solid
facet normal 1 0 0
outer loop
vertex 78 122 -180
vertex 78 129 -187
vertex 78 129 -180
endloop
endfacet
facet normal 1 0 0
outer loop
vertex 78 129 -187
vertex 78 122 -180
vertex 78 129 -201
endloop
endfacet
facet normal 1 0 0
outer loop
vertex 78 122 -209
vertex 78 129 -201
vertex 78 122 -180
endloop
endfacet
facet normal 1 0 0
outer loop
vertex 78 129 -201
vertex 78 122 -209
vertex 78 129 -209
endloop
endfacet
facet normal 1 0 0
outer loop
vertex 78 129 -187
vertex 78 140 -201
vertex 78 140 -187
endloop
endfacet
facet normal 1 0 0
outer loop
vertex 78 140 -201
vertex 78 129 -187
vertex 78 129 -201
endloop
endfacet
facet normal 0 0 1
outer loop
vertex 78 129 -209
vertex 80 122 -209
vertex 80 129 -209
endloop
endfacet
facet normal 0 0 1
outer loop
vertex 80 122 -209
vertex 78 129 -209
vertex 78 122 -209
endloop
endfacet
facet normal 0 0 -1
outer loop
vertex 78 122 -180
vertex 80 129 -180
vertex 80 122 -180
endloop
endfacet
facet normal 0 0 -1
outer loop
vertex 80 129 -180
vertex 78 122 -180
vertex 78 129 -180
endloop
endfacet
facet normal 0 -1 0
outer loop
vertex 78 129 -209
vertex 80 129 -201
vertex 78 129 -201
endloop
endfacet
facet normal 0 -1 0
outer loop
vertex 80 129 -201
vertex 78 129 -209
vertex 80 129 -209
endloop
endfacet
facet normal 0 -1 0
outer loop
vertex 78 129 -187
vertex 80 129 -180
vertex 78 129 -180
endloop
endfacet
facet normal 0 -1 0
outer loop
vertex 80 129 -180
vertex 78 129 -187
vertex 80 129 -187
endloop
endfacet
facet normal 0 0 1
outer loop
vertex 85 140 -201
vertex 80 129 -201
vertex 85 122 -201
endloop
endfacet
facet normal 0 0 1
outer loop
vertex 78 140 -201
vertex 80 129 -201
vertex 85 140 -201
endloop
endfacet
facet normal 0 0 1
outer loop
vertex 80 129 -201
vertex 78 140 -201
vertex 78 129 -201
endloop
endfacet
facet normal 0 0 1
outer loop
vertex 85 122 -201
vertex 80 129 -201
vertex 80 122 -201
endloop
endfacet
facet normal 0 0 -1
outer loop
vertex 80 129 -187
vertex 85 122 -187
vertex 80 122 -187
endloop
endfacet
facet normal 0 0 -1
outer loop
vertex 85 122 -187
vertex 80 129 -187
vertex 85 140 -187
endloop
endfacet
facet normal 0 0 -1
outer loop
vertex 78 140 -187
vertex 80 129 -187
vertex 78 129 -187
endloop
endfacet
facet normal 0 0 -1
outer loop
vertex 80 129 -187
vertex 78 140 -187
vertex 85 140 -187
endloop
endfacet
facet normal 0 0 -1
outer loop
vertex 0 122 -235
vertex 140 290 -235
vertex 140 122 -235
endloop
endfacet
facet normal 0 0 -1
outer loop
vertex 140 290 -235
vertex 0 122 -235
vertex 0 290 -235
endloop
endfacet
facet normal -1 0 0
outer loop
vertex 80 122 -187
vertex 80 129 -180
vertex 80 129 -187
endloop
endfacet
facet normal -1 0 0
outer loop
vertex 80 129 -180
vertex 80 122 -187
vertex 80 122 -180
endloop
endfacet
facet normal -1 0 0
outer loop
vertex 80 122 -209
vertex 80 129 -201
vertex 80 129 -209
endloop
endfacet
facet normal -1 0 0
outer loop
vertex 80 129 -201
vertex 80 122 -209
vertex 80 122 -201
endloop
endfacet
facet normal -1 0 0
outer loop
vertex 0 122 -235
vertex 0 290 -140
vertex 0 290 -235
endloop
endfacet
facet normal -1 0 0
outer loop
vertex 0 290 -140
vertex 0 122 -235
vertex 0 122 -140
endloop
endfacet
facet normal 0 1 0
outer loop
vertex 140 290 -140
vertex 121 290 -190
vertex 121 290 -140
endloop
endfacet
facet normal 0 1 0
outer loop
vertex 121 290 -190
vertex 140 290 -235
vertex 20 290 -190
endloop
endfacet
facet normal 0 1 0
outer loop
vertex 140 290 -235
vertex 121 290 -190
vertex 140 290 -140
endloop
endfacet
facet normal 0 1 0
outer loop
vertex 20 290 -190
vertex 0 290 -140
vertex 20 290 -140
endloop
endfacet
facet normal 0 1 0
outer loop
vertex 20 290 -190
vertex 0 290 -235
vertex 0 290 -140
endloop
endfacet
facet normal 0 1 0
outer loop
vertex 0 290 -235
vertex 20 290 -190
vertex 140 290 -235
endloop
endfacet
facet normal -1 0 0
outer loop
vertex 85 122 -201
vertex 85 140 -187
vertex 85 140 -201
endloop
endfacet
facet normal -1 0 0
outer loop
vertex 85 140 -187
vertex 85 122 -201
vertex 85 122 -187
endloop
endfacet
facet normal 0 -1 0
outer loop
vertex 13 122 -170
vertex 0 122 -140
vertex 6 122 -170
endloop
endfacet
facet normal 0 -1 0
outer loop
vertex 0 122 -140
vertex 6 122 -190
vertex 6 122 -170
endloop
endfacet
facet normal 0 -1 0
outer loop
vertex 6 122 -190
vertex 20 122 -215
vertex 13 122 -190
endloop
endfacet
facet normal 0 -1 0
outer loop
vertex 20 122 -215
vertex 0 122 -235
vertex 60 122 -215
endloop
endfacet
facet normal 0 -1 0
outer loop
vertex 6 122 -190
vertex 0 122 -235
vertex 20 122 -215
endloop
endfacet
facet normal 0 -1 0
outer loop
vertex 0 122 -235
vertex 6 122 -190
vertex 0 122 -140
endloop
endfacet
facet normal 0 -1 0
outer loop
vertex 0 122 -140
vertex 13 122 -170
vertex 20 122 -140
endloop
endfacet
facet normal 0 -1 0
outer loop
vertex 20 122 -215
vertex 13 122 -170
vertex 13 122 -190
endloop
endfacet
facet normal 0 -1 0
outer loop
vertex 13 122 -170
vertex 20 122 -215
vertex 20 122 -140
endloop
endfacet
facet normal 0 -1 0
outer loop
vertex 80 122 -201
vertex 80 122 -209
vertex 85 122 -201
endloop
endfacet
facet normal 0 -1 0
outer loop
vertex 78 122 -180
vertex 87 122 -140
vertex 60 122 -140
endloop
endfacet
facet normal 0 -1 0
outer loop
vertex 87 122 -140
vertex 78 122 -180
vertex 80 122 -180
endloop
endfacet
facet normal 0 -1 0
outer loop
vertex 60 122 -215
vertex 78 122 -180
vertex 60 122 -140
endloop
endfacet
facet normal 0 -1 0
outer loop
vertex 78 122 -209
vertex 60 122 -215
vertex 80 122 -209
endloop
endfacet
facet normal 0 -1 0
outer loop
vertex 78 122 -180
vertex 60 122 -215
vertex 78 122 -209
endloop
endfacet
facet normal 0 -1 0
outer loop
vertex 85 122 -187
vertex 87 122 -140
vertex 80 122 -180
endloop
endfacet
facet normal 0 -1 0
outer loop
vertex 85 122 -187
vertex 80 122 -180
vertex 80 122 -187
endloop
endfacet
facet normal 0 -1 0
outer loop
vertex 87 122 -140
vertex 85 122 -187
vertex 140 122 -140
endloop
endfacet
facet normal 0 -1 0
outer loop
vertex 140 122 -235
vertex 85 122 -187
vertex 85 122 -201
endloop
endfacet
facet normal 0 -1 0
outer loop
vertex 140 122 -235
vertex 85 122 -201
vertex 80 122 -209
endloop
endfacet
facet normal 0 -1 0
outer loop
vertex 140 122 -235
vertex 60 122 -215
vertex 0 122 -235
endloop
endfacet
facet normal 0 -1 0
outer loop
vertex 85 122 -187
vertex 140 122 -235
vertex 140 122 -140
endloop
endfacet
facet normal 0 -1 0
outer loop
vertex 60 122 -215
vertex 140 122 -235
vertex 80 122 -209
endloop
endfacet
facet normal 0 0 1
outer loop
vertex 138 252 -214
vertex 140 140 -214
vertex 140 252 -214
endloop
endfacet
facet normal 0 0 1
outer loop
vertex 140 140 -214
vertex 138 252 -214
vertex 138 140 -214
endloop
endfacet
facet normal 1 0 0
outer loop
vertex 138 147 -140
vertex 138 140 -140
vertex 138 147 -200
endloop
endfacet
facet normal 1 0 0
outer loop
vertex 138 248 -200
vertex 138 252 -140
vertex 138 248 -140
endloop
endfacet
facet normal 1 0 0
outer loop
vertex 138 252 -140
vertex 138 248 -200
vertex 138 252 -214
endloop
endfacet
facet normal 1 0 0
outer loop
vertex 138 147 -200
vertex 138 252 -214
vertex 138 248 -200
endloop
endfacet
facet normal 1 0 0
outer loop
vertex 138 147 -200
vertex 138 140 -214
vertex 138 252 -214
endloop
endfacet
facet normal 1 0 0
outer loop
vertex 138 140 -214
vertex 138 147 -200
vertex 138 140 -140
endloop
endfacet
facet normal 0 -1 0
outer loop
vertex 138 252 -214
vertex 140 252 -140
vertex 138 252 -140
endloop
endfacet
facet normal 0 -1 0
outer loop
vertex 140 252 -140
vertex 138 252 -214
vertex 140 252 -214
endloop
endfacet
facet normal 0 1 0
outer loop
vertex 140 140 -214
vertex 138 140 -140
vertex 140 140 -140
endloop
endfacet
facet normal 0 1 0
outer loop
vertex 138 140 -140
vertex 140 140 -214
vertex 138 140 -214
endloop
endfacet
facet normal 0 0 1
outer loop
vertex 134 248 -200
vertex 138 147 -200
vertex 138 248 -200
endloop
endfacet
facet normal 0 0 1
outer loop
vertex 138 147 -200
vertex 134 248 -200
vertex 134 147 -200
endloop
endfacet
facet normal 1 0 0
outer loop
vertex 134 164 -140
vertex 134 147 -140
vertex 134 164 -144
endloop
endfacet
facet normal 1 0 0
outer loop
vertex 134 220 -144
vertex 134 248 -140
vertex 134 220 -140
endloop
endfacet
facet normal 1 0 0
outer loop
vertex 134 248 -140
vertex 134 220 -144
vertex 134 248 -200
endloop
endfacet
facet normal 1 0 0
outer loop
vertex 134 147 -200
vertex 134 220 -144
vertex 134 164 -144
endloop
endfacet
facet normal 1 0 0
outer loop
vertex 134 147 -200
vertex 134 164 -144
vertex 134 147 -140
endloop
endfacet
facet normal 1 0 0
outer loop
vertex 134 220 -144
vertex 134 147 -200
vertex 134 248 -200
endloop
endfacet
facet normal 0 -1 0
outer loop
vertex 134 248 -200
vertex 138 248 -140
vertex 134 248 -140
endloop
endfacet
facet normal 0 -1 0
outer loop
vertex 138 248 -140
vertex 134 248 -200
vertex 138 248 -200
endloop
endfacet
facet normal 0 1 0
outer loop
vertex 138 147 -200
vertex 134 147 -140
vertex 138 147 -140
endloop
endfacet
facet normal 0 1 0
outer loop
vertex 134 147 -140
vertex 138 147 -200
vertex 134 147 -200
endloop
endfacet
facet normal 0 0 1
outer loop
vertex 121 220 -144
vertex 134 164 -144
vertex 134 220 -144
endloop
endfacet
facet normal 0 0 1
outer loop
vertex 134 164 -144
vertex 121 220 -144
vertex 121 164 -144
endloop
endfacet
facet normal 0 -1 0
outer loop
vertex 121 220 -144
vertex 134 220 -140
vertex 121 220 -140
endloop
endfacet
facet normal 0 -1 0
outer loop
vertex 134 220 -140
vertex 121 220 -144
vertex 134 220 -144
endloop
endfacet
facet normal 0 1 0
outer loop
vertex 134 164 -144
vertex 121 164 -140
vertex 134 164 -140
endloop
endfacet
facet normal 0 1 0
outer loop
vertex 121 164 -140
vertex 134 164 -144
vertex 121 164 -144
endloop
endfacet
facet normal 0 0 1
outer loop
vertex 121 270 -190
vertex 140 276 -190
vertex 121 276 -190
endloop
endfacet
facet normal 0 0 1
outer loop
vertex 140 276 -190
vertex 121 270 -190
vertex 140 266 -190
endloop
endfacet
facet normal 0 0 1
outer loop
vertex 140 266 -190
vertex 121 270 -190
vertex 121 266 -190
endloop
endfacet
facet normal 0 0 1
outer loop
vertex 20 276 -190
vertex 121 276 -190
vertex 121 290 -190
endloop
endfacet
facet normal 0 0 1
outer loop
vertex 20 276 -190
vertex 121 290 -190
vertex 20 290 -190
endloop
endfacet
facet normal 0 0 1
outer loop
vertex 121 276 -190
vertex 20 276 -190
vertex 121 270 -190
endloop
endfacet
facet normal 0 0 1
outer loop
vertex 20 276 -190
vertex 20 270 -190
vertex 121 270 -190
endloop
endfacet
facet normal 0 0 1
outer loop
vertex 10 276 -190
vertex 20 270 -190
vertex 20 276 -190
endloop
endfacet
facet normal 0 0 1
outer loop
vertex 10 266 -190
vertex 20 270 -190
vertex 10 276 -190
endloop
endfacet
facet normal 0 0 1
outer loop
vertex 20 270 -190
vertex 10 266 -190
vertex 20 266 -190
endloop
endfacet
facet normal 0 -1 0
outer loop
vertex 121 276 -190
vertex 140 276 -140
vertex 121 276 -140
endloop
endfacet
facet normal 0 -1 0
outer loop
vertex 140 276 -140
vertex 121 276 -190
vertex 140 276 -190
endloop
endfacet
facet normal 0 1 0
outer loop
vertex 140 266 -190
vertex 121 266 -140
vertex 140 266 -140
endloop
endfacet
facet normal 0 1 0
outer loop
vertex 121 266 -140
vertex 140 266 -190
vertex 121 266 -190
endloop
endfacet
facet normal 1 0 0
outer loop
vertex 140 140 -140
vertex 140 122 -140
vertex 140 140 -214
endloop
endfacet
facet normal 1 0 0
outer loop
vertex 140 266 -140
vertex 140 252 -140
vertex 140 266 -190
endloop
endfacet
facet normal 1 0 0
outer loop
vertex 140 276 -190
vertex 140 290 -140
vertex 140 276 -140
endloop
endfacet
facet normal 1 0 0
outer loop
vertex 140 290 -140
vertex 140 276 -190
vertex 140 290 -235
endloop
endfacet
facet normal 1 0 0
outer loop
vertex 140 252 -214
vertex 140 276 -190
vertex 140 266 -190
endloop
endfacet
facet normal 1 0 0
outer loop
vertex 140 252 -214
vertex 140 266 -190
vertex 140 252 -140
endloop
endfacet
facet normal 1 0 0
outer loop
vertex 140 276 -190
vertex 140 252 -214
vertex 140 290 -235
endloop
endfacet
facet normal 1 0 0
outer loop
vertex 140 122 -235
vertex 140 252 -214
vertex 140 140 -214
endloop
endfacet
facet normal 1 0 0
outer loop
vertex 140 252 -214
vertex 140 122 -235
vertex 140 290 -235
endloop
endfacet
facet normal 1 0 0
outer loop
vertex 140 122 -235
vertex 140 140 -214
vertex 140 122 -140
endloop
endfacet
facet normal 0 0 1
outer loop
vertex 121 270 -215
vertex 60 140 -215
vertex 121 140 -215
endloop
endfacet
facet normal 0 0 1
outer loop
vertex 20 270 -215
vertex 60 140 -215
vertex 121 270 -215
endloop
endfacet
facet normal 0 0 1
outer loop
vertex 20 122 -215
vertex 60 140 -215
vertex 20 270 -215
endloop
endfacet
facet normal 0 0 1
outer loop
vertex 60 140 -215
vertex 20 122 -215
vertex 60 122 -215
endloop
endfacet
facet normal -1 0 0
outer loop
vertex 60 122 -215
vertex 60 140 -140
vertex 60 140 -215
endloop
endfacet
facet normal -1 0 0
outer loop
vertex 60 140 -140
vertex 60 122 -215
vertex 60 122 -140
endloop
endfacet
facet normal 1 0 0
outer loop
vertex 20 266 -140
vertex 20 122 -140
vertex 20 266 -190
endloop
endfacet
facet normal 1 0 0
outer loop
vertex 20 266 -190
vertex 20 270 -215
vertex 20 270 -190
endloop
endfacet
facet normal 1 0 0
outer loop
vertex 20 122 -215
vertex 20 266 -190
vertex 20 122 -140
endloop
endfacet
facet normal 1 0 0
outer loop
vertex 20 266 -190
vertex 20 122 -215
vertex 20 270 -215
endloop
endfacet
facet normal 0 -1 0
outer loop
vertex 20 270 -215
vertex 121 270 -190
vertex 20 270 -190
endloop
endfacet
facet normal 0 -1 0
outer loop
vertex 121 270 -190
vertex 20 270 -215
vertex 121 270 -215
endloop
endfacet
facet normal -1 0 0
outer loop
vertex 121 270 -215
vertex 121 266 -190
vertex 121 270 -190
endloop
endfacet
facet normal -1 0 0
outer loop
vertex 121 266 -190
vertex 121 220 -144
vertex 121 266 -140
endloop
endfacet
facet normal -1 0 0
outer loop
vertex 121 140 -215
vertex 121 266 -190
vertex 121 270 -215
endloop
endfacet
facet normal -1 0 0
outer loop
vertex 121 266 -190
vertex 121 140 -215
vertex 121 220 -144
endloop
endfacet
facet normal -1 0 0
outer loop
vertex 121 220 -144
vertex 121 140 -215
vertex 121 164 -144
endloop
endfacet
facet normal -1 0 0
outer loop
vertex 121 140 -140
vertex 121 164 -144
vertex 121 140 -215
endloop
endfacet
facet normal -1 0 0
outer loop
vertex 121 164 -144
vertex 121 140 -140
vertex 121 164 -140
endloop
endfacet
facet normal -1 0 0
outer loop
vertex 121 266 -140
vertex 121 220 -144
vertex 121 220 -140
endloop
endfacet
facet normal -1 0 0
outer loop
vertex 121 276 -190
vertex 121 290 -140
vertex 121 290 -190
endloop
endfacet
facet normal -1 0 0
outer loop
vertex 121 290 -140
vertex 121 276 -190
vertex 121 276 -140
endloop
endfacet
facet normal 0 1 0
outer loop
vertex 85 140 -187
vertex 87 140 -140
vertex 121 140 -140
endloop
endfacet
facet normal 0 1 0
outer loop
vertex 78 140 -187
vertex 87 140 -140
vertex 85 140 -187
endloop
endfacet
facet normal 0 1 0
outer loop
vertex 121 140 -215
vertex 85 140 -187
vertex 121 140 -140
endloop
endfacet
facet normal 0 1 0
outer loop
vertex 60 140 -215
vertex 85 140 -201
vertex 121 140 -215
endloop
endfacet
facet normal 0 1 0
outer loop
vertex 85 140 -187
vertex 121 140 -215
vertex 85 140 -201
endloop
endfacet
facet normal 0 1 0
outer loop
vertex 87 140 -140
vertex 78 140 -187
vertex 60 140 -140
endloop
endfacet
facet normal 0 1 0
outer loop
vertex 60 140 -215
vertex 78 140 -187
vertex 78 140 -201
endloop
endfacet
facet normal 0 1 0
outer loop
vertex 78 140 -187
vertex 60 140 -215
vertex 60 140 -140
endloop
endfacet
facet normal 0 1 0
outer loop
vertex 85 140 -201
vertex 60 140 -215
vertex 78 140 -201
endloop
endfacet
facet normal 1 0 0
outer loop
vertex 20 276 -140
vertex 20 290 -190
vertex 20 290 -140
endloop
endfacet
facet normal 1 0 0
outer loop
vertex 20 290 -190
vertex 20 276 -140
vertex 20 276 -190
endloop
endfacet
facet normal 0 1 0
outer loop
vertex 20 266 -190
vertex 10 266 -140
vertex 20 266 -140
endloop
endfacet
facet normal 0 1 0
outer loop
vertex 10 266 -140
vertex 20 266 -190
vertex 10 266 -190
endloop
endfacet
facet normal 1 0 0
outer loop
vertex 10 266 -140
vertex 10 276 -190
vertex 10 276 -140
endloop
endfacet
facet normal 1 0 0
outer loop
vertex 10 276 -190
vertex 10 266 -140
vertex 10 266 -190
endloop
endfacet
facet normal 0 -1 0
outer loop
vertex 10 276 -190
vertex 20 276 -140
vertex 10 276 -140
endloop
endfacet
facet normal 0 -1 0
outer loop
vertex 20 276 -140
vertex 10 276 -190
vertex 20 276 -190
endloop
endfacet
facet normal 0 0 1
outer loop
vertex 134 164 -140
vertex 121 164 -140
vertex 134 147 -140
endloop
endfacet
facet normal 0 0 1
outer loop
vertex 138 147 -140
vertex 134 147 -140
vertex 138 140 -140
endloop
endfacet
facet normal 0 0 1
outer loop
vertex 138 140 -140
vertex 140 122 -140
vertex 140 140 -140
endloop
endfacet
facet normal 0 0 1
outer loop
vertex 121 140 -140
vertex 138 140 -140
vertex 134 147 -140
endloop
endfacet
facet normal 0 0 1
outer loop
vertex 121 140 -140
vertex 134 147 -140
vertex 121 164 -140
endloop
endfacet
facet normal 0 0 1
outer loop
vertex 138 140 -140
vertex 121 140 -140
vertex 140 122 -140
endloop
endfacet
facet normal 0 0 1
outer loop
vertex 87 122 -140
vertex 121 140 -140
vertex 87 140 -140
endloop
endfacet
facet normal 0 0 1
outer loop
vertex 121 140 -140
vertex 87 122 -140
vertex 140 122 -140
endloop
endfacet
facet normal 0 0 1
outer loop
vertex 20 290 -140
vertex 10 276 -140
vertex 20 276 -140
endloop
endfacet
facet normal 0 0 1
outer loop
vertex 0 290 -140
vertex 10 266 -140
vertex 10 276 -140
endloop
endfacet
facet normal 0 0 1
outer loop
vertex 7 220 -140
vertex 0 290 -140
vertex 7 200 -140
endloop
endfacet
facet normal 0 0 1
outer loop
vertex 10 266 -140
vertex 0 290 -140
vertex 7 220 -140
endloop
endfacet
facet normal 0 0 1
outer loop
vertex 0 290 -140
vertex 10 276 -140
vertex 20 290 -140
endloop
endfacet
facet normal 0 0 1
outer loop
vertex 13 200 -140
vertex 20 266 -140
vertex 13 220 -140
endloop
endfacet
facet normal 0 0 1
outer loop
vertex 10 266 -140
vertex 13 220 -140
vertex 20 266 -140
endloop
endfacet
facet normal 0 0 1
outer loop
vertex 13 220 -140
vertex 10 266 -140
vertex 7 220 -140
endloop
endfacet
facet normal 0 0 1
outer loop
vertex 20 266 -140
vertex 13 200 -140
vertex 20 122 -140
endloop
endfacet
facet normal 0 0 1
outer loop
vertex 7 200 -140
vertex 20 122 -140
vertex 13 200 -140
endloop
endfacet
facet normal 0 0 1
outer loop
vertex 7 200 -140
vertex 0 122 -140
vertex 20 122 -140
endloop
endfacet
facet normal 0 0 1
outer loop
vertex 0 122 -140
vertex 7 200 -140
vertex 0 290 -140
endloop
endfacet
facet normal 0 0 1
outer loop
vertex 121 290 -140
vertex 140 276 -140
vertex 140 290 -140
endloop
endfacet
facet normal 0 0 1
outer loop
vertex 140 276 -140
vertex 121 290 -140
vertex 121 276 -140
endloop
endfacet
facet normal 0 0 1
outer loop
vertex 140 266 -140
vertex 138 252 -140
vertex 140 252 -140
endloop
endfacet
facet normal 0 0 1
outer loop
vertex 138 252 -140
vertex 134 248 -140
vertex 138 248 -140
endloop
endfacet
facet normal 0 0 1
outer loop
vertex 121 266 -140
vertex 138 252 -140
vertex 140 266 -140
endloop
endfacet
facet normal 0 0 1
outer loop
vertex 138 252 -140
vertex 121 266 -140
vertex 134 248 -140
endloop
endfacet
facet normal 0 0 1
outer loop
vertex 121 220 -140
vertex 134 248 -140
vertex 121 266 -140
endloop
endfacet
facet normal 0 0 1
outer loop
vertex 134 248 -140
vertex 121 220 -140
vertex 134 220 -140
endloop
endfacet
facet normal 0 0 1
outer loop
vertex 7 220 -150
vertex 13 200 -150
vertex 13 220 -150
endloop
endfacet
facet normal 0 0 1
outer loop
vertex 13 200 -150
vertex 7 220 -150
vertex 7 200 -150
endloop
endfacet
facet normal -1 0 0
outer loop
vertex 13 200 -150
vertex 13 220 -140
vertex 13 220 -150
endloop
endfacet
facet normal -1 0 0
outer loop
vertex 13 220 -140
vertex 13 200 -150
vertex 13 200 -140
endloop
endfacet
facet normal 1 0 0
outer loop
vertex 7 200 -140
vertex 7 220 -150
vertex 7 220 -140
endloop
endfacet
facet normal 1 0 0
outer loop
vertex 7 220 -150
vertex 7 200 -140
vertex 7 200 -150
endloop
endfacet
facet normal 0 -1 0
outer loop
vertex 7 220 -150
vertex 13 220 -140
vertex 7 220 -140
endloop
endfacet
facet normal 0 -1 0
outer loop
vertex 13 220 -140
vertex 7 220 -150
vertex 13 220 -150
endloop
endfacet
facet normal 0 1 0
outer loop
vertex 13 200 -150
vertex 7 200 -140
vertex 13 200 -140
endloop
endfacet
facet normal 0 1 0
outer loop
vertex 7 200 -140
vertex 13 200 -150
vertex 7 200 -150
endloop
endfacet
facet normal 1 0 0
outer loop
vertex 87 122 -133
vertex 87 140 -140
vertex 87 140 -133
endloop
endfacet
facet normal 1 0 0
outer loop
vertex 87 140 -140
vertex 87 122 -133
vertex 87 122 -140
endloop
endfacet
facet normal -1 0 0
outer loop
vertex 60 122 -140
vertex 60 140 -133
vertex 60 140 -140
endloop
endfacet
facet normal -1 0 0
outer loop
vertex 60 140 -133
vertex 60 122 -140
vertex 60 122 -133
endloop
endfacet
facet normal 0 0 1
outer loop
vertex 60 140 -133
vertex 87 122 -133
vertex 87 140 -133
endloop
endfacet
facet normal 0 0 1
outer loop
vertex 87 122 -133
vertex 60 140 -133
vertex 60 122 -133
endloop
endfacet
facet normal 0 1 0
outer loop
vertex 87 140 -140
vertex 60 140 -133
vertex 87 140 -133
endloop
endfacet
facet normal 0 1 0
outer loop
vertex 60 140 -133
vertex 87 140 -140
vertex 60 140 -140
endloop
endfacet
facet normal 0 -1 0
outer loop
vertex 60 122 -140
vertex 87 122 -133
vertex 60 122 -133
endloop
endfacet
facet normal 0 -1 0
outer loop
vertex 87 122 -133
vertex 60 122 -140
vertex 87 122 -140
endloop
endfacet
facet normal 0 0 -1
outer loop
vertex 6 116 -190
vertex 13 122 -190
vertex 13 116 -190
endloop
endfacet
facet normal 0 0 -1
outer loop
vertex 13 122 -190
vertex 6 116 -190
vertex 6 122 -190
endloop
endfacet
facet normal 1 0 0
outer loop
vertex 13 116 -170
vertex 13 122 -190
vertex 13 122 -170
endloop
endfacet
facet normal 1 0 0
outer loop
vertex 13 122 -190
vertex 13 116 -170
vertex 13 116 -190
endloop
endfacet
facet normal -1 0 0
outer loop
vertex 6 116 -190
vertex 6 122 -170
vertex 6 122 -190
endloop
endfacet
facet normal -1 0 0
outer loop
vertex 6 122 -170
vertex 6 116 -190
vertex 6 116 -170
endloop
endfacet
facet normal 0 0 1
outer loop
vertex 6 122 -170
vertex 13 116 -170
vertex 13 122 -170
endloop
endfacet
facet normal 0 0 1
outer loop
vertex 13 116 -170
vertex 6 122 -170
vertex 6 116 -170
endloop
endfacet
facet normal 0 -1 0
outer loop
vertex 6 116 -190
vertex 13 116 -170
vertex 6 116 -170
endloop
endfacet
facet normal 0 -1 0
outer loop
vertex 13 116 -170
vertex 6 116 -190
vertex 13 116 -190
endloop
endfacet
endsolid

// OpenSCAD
rotate(a=90,v=[0,1,0]) {
difference() {
    union() {
        difference() {
            cube([235,290,80]); // bottom
            
            union() {
                translate([168,20,78])
                cube([53,74,3]);    // nfc
                translate([180,94,78])
                cube([29,35,3]);    // nfc module
                translate([187,122,78])
                cube([14,20,3]);    // nfc line
                
                translate([50,-1,30])
                cube([57,11,5]);    // printer
            }
        }
        
        translate([0,60,80])
        rotate(a=90,v=[0,1,0]) {
            cylinder(r=60,h=140,$fn=50);    // front
        }
        
        difference() {
            translate([0,60,80])
            cube([140,65,60]);  // front2
        }
        
        difference() {
            translate([0,122,80])
            cube([235,168,60]); // back
            
            union() {
                translate([187,122,79])
                cube([14,20,6]);    // nfc line
                
                translate([21,140,138])
                cube([193,112,3]);  // lcd
                translate([33,147,134])
                cube([167,101,5]);  // lcd bottom
                translate([79,164,120])
                cube([65,56,15]);   // lcd module
                translate([98,220,130])
                cube([40,32,10]);    // lcd line
                
                translate([45,266,120])
                cube([145,10,21]);  // back lid
            }
        }
    }
    
    union() {
        translate([20,10,20])
        cube([195,260,40]); // inside bottom
        
        translate([20,10,60])
        cube([113,130,27]); // inside printer
        translate([20,140,60])
        cube([195,130,61]); // inside lcd
        
        translate([45,266,20])
        cube([145,25,101]); // inside back lid
        translate([45,266,10])
        cube([145,10,11]);  // inside bottom lid
        
        translate([-1,-1,-1])
        cube([141,292,142]);
        translate([140,-1,-1])
        cube([96,123,142]);
        
        translate([139,200,7])
        cube([11,20,6]);
    }
}

translate([133,122,60])
cube([7,18,27]);   // 133+7,10+130,60+27

translate([170,116,6])
cube([20,7,7]);

}
